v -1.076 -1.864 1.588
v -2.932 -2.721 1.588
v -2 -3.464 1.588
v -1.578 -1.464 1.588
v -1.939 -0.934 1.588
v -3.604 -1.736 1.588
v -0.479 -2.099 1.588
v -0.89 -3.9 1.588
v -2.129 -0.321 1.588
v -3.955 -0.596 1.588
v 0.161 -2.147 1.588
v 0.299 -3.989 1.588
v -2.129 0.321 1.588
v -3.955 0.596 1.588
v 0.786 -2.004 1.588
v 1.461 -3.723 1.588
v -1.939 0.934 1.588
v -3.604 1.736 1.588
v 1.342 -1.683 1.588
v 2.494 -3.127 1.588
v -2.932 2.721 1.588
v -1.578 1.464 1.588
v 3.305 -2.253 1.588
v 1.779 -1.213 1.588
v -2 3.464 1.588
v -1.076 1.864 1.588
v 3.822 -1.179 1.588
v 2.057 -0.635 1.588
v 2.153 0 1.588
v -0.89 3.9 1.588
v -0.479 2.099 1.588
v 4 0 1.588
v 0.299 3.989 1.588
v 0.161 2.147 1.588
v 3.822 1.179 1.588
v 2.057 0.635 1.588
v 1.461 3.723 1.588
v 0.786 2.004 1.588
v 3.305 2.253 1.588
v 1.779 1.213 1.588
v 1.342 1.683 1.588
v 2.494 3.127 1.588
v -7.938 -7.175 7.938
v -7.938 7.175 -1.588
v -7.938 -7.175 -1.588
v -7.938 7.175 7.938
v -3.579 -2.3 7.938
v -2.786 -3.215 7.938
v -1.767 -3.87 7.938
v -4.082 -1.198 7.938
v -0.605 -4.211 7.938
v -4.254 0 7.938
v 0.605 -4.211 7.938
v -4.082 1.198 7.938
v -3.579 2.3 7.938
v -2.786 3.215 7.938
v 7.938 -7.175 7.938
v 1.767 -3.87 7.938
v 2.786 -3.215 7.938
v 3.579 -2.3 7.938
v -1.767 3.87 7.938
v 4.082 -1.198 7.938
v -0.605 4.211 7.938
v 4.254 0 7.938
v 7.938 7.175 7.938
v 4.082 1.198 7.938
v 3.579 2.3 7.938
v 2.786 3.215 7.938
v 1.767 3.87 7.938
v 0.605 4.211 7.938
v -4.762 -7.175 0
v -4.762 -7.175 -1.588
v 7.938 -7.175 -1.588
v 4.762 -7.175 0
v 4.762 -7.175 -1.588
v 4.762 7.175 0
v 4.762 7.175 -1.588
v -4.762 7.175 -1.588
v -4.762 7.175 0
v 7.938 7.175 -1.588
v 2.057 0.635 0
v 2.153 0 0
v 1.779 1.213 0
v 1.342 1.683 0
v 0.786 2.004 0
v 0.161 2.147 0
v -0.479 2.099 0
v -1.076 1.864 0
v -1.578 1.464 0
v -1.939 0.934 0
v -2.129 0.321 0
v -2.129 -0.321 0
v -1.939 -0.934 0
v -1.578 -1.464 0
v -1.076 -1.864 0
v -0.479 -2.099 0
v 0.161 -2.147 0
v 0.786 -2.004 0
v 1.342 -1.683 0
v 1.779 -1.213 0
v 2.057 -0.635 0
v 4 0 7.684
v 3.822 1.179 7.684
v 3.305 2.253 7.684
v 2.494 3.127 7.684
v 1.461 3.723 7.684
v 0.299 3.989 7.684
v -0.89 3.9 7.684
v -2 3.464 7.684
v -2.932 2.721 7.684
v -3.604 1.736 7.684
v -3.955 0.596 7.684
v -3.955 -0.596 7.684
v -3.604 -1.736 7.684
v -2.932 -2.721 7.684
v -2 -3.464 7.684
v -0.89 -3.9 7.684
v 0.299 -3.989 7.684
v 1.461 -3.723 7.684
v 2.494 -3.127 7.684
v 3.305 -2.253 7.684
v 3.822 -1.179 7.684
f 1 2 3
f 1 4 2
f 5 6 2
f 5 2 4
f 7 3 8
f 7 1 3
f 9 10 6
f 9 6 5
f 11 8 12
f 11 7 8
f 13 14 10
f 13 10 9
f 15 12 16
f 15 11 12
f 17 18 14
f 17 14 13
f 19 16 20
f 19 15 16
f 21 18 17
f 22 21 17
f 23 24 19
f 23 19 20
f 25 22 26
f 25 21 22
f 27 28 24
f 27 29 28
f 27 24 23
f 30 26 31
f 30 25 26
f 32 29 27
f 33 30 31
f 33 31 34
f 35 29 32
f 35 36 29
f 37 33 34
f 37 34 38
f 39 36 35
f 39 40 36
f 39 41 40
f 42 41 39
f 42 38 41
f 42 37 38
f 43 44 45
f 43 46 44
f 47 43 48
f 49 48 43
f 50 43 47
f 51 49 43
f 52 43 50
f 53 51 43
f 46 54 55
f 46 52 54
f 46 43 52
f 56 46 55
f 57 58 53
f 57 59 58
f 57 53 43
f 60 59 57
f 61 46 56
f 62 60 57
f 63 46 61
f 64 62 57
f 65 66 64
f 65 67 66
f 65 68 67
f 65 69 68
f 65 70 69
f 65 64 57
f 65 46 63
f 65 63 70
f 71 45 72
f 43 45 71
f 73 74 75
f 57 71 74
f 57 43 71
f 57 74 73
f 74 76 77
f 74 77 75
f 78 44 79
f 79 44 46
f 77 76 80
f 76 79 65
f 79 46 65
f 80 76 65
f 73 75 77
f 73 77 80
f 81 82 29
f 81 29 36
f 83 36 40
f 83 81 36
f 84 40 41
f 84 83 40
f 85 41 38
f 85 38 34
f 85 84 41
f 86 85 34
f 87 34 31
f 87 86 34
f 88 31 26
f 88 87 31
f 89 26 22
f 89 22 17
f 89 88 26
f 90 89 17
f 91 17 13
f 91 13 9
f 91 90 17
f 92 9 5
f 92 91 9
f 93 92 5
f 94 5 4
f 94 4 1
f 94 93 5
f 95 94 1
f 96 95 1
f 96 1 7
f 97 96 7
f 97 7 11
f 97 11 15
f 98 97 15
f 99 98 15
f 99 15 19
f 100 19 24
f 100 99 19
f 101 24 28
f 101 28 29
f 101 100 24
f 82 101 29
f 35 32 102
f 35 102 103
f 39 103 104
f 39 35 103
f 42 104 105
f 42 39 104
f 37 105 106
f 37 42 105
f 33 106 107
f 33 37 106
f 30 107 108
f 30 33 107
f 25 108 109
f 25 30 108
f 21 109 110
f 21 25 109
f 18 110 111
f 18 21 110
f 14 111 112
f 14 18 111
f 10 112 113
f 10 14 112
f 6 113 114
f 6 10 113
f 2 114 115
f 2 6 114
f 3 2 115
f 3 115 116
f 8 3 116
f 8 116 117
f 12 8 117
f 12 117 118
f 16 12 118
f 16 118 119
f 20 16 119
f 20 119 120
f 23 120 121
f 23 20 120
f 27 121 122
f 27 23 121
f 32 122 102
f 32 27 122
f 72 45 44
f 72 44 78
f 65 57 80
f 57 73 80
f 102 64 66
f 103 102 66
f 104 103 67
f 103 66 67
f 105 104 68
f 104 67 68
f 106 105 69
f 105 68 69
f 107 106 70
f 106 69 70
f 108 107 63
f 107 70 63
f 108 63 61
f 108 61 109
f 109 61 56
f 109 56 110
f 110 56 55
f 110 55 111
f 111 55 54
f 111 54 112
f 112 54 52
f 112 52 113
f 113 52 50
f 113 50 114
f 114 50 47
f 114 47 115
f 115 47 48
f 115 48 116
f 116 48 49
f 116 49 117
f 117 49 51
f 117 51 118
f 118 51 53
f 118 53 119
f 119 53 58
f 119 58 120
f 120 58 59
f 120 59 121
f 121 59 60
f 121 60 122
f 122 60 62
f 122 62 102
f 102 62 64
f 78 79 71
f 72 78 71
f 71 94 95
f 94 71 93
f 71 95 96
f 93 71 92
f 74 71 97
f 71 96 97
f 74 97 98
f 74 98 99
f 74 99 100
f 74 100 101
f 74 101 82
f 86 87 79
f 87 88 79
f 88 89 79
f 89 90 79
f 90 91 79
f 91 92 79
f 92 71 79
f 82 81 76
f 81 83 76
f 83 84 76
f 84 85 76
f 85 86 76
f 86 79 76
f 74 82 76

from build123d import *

# Parameters (mm, degrees)
F0_W     = 15.875
F0_H     = 14.35001
F0_R     = 2.15265
F1_DEPTH = 1.5875
F2_W     = 15.875
F2_H     = 14.35001
F2_R     = 4
F3_DEPTH = 6.35
F4_SIZE  = 0.254
F5_W     = 3.175
F5_H     = 14.35001
F6_DEPTH = 1.5875


with BuildPart() as f1:
    # F0 (on Top) → F1 (new body)
    with BuildSketch(Plane.XY):
        Rectangle(F0_W, F0_H)
        Circle(F0_R, mode=Mode.SUBTRACT)
    extrude(amount=F1_DEPTH)

    # F2 (on face) → F3 (join)
    with BuildSketch(Plane.XY.offset(1.5875)):
        Rectangle(F2_W, F2_H)
        Circle(F2_R, mode=Mode.SUBTRACT)
    extrude(amount=F3_DEPTH)

    # F4
    f4_edges = [f1.edges().sort_by_distance(p)[0] for p in [
        (-4, 0, 7.9375),
    ]]
    chamfer(f4_edges, length=F4_SIZE)

    # F5 (on face) → F6 (join)
    with BuildSketch(Plane(origin=(0, 0, 0), x_dir=(1, 0, 0), z_dir=(0, 0, -1))):
        with Locations((-6.35, 0)):
            Rectangle(F5_W, F5_H)
        with Locations((6.35, 0)):
            Rectangle(F5_W, F5_H)
    extrude(amount=F6_DEPTH)


solid = f1.part
